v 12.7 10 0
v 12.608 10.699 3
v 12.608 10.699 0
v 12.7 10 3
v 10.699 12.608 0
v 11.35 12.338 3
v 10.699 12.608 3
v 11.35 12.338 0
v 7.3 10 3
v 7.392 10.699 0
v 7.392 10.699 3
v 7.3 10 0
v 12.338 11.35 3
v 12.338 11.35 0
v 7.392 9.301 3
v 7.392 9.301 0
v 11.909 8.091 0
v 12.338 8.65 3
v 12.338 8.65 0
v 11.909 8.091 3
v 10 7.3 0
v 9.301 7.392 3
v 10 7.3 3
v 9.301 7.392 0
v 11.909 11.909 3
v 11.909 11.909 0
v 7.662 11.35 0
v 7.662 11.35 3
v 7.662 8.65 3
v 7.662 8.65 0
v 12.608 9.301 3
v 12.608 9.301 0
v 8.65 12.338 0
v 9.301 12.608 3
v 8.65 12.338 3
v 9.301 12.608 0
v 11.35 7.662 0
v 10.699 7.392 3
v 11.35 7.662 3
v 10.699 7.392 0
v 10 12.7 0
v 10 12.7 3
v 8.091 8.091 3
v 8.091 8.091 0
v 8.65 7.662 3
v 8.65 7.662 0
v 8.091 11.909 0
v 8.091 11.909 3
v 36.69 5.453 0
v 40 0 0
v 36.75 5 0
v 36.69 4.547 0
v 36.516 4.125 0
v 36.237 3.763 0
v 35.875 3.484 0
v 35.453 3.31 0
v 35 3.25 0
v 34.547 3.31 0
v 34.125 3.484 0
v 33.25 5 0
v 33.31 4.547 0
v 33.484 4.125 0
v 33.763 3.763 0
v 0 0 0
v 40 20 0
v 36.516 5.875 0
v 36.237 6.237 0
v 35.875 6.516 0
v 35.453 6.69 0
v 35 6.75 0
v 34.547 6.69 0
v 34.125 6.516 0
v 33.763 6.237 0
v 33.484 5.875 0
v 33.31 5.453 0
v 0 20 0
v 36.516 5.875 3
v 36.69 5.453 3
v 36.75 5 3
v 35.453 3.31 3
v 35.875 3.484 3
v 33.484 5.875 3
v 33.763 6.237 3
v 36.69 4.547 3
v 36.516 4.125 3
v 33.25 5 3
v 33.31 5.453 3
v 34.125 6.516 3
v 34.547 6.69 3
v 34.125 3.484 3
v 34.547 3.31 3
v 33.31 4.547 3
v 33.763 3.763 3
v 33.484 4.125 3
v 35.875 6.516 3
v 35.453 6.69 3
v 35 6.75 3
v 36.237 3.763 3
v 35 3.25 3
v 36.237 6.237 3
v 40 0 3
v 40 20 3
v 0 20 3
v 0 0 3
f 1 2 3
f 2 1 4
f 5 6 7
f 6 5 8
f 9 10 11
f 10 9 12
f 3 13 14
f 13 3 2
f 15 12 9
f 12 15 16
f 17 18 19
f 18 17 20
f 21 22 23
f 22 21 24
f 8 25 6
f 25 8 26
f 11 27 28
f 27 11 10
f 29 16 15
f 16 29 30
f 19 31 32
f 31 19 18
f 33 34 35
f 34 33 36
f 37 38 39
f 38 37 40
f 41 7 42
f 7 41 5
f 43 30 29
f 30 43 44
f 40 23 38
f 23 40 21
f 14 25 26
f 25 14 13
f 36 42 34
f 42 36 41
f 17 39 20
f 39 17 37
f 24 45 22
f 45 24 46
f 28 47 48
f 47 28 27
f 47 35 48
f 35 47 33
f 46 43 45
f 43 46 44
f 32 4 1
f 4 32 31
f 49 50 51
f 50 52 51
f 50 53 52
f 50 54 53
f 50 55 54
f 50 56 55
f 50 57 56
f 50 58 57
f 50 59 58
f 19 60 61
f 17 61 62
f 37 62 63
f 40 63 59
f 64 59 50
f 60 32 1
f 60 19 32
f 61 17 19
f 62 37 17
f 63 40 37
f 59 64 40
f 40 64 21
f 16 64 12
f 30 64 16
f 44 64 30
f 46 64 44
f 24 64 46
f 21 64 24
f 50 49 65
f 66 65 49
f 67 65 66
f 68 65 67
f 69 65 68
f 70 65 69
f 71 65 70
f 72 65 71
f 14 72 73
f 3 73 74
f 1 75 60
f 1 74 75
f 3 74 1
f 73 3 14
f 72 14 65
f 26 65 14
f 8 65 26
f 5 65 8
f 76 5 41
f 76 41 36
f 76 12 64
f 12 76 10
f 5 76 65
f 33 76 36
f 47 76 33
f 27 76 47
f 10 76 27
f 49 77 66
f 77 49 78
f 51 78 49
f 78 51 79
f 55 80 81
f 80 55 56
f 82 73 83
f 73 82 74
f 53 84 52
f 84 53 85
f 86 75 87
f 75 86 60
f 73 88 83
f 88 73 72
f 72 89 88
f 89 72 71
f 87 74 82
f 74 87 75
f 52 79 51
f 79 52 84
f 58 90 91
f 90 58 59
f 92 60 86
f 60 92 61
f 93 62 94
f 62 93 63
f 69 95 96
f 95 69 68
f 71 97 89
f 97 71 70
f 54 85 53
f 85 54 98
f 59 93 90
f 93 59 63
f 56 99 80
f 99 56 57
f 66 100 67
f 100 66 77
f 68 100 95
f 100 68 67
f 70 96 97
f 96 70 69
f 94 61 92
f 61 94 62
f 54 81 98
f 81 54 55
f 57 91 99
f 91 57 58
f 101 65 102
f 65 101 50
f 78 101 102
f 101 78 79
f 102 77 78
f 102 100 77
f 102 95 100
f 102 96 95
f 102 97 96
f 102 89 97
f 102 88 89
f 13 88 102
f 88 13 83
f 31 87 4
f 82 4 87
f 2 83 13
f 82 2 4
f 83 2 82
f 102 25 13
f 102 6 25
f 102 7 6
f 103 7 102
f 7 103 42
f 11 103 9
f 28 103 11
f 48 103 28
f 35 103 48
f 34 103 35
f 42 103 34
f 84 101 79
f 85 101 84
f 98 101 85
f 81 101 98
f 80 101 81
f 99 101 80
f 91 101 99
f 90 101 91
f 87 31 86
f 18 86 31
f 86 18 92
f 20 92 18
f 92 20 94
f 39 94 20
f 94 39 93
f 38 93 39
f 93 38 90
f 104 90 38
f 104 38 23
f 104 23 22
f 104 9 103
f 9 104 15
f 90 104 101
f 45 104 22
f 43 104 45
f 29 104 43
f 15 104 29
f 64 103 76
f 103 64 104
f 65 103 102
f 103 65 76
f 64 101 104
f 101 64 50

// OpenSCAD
difference()
{
    union()
    {
        cube([40,20,3]);
    }
    union()
    {
        translate([10,10,0])
            cylinder(d=5.4,h=5,$fn=24);
        translate([35,5,0])
            cylinder(d=3.5,h=5,$fn=24);
    }
}
